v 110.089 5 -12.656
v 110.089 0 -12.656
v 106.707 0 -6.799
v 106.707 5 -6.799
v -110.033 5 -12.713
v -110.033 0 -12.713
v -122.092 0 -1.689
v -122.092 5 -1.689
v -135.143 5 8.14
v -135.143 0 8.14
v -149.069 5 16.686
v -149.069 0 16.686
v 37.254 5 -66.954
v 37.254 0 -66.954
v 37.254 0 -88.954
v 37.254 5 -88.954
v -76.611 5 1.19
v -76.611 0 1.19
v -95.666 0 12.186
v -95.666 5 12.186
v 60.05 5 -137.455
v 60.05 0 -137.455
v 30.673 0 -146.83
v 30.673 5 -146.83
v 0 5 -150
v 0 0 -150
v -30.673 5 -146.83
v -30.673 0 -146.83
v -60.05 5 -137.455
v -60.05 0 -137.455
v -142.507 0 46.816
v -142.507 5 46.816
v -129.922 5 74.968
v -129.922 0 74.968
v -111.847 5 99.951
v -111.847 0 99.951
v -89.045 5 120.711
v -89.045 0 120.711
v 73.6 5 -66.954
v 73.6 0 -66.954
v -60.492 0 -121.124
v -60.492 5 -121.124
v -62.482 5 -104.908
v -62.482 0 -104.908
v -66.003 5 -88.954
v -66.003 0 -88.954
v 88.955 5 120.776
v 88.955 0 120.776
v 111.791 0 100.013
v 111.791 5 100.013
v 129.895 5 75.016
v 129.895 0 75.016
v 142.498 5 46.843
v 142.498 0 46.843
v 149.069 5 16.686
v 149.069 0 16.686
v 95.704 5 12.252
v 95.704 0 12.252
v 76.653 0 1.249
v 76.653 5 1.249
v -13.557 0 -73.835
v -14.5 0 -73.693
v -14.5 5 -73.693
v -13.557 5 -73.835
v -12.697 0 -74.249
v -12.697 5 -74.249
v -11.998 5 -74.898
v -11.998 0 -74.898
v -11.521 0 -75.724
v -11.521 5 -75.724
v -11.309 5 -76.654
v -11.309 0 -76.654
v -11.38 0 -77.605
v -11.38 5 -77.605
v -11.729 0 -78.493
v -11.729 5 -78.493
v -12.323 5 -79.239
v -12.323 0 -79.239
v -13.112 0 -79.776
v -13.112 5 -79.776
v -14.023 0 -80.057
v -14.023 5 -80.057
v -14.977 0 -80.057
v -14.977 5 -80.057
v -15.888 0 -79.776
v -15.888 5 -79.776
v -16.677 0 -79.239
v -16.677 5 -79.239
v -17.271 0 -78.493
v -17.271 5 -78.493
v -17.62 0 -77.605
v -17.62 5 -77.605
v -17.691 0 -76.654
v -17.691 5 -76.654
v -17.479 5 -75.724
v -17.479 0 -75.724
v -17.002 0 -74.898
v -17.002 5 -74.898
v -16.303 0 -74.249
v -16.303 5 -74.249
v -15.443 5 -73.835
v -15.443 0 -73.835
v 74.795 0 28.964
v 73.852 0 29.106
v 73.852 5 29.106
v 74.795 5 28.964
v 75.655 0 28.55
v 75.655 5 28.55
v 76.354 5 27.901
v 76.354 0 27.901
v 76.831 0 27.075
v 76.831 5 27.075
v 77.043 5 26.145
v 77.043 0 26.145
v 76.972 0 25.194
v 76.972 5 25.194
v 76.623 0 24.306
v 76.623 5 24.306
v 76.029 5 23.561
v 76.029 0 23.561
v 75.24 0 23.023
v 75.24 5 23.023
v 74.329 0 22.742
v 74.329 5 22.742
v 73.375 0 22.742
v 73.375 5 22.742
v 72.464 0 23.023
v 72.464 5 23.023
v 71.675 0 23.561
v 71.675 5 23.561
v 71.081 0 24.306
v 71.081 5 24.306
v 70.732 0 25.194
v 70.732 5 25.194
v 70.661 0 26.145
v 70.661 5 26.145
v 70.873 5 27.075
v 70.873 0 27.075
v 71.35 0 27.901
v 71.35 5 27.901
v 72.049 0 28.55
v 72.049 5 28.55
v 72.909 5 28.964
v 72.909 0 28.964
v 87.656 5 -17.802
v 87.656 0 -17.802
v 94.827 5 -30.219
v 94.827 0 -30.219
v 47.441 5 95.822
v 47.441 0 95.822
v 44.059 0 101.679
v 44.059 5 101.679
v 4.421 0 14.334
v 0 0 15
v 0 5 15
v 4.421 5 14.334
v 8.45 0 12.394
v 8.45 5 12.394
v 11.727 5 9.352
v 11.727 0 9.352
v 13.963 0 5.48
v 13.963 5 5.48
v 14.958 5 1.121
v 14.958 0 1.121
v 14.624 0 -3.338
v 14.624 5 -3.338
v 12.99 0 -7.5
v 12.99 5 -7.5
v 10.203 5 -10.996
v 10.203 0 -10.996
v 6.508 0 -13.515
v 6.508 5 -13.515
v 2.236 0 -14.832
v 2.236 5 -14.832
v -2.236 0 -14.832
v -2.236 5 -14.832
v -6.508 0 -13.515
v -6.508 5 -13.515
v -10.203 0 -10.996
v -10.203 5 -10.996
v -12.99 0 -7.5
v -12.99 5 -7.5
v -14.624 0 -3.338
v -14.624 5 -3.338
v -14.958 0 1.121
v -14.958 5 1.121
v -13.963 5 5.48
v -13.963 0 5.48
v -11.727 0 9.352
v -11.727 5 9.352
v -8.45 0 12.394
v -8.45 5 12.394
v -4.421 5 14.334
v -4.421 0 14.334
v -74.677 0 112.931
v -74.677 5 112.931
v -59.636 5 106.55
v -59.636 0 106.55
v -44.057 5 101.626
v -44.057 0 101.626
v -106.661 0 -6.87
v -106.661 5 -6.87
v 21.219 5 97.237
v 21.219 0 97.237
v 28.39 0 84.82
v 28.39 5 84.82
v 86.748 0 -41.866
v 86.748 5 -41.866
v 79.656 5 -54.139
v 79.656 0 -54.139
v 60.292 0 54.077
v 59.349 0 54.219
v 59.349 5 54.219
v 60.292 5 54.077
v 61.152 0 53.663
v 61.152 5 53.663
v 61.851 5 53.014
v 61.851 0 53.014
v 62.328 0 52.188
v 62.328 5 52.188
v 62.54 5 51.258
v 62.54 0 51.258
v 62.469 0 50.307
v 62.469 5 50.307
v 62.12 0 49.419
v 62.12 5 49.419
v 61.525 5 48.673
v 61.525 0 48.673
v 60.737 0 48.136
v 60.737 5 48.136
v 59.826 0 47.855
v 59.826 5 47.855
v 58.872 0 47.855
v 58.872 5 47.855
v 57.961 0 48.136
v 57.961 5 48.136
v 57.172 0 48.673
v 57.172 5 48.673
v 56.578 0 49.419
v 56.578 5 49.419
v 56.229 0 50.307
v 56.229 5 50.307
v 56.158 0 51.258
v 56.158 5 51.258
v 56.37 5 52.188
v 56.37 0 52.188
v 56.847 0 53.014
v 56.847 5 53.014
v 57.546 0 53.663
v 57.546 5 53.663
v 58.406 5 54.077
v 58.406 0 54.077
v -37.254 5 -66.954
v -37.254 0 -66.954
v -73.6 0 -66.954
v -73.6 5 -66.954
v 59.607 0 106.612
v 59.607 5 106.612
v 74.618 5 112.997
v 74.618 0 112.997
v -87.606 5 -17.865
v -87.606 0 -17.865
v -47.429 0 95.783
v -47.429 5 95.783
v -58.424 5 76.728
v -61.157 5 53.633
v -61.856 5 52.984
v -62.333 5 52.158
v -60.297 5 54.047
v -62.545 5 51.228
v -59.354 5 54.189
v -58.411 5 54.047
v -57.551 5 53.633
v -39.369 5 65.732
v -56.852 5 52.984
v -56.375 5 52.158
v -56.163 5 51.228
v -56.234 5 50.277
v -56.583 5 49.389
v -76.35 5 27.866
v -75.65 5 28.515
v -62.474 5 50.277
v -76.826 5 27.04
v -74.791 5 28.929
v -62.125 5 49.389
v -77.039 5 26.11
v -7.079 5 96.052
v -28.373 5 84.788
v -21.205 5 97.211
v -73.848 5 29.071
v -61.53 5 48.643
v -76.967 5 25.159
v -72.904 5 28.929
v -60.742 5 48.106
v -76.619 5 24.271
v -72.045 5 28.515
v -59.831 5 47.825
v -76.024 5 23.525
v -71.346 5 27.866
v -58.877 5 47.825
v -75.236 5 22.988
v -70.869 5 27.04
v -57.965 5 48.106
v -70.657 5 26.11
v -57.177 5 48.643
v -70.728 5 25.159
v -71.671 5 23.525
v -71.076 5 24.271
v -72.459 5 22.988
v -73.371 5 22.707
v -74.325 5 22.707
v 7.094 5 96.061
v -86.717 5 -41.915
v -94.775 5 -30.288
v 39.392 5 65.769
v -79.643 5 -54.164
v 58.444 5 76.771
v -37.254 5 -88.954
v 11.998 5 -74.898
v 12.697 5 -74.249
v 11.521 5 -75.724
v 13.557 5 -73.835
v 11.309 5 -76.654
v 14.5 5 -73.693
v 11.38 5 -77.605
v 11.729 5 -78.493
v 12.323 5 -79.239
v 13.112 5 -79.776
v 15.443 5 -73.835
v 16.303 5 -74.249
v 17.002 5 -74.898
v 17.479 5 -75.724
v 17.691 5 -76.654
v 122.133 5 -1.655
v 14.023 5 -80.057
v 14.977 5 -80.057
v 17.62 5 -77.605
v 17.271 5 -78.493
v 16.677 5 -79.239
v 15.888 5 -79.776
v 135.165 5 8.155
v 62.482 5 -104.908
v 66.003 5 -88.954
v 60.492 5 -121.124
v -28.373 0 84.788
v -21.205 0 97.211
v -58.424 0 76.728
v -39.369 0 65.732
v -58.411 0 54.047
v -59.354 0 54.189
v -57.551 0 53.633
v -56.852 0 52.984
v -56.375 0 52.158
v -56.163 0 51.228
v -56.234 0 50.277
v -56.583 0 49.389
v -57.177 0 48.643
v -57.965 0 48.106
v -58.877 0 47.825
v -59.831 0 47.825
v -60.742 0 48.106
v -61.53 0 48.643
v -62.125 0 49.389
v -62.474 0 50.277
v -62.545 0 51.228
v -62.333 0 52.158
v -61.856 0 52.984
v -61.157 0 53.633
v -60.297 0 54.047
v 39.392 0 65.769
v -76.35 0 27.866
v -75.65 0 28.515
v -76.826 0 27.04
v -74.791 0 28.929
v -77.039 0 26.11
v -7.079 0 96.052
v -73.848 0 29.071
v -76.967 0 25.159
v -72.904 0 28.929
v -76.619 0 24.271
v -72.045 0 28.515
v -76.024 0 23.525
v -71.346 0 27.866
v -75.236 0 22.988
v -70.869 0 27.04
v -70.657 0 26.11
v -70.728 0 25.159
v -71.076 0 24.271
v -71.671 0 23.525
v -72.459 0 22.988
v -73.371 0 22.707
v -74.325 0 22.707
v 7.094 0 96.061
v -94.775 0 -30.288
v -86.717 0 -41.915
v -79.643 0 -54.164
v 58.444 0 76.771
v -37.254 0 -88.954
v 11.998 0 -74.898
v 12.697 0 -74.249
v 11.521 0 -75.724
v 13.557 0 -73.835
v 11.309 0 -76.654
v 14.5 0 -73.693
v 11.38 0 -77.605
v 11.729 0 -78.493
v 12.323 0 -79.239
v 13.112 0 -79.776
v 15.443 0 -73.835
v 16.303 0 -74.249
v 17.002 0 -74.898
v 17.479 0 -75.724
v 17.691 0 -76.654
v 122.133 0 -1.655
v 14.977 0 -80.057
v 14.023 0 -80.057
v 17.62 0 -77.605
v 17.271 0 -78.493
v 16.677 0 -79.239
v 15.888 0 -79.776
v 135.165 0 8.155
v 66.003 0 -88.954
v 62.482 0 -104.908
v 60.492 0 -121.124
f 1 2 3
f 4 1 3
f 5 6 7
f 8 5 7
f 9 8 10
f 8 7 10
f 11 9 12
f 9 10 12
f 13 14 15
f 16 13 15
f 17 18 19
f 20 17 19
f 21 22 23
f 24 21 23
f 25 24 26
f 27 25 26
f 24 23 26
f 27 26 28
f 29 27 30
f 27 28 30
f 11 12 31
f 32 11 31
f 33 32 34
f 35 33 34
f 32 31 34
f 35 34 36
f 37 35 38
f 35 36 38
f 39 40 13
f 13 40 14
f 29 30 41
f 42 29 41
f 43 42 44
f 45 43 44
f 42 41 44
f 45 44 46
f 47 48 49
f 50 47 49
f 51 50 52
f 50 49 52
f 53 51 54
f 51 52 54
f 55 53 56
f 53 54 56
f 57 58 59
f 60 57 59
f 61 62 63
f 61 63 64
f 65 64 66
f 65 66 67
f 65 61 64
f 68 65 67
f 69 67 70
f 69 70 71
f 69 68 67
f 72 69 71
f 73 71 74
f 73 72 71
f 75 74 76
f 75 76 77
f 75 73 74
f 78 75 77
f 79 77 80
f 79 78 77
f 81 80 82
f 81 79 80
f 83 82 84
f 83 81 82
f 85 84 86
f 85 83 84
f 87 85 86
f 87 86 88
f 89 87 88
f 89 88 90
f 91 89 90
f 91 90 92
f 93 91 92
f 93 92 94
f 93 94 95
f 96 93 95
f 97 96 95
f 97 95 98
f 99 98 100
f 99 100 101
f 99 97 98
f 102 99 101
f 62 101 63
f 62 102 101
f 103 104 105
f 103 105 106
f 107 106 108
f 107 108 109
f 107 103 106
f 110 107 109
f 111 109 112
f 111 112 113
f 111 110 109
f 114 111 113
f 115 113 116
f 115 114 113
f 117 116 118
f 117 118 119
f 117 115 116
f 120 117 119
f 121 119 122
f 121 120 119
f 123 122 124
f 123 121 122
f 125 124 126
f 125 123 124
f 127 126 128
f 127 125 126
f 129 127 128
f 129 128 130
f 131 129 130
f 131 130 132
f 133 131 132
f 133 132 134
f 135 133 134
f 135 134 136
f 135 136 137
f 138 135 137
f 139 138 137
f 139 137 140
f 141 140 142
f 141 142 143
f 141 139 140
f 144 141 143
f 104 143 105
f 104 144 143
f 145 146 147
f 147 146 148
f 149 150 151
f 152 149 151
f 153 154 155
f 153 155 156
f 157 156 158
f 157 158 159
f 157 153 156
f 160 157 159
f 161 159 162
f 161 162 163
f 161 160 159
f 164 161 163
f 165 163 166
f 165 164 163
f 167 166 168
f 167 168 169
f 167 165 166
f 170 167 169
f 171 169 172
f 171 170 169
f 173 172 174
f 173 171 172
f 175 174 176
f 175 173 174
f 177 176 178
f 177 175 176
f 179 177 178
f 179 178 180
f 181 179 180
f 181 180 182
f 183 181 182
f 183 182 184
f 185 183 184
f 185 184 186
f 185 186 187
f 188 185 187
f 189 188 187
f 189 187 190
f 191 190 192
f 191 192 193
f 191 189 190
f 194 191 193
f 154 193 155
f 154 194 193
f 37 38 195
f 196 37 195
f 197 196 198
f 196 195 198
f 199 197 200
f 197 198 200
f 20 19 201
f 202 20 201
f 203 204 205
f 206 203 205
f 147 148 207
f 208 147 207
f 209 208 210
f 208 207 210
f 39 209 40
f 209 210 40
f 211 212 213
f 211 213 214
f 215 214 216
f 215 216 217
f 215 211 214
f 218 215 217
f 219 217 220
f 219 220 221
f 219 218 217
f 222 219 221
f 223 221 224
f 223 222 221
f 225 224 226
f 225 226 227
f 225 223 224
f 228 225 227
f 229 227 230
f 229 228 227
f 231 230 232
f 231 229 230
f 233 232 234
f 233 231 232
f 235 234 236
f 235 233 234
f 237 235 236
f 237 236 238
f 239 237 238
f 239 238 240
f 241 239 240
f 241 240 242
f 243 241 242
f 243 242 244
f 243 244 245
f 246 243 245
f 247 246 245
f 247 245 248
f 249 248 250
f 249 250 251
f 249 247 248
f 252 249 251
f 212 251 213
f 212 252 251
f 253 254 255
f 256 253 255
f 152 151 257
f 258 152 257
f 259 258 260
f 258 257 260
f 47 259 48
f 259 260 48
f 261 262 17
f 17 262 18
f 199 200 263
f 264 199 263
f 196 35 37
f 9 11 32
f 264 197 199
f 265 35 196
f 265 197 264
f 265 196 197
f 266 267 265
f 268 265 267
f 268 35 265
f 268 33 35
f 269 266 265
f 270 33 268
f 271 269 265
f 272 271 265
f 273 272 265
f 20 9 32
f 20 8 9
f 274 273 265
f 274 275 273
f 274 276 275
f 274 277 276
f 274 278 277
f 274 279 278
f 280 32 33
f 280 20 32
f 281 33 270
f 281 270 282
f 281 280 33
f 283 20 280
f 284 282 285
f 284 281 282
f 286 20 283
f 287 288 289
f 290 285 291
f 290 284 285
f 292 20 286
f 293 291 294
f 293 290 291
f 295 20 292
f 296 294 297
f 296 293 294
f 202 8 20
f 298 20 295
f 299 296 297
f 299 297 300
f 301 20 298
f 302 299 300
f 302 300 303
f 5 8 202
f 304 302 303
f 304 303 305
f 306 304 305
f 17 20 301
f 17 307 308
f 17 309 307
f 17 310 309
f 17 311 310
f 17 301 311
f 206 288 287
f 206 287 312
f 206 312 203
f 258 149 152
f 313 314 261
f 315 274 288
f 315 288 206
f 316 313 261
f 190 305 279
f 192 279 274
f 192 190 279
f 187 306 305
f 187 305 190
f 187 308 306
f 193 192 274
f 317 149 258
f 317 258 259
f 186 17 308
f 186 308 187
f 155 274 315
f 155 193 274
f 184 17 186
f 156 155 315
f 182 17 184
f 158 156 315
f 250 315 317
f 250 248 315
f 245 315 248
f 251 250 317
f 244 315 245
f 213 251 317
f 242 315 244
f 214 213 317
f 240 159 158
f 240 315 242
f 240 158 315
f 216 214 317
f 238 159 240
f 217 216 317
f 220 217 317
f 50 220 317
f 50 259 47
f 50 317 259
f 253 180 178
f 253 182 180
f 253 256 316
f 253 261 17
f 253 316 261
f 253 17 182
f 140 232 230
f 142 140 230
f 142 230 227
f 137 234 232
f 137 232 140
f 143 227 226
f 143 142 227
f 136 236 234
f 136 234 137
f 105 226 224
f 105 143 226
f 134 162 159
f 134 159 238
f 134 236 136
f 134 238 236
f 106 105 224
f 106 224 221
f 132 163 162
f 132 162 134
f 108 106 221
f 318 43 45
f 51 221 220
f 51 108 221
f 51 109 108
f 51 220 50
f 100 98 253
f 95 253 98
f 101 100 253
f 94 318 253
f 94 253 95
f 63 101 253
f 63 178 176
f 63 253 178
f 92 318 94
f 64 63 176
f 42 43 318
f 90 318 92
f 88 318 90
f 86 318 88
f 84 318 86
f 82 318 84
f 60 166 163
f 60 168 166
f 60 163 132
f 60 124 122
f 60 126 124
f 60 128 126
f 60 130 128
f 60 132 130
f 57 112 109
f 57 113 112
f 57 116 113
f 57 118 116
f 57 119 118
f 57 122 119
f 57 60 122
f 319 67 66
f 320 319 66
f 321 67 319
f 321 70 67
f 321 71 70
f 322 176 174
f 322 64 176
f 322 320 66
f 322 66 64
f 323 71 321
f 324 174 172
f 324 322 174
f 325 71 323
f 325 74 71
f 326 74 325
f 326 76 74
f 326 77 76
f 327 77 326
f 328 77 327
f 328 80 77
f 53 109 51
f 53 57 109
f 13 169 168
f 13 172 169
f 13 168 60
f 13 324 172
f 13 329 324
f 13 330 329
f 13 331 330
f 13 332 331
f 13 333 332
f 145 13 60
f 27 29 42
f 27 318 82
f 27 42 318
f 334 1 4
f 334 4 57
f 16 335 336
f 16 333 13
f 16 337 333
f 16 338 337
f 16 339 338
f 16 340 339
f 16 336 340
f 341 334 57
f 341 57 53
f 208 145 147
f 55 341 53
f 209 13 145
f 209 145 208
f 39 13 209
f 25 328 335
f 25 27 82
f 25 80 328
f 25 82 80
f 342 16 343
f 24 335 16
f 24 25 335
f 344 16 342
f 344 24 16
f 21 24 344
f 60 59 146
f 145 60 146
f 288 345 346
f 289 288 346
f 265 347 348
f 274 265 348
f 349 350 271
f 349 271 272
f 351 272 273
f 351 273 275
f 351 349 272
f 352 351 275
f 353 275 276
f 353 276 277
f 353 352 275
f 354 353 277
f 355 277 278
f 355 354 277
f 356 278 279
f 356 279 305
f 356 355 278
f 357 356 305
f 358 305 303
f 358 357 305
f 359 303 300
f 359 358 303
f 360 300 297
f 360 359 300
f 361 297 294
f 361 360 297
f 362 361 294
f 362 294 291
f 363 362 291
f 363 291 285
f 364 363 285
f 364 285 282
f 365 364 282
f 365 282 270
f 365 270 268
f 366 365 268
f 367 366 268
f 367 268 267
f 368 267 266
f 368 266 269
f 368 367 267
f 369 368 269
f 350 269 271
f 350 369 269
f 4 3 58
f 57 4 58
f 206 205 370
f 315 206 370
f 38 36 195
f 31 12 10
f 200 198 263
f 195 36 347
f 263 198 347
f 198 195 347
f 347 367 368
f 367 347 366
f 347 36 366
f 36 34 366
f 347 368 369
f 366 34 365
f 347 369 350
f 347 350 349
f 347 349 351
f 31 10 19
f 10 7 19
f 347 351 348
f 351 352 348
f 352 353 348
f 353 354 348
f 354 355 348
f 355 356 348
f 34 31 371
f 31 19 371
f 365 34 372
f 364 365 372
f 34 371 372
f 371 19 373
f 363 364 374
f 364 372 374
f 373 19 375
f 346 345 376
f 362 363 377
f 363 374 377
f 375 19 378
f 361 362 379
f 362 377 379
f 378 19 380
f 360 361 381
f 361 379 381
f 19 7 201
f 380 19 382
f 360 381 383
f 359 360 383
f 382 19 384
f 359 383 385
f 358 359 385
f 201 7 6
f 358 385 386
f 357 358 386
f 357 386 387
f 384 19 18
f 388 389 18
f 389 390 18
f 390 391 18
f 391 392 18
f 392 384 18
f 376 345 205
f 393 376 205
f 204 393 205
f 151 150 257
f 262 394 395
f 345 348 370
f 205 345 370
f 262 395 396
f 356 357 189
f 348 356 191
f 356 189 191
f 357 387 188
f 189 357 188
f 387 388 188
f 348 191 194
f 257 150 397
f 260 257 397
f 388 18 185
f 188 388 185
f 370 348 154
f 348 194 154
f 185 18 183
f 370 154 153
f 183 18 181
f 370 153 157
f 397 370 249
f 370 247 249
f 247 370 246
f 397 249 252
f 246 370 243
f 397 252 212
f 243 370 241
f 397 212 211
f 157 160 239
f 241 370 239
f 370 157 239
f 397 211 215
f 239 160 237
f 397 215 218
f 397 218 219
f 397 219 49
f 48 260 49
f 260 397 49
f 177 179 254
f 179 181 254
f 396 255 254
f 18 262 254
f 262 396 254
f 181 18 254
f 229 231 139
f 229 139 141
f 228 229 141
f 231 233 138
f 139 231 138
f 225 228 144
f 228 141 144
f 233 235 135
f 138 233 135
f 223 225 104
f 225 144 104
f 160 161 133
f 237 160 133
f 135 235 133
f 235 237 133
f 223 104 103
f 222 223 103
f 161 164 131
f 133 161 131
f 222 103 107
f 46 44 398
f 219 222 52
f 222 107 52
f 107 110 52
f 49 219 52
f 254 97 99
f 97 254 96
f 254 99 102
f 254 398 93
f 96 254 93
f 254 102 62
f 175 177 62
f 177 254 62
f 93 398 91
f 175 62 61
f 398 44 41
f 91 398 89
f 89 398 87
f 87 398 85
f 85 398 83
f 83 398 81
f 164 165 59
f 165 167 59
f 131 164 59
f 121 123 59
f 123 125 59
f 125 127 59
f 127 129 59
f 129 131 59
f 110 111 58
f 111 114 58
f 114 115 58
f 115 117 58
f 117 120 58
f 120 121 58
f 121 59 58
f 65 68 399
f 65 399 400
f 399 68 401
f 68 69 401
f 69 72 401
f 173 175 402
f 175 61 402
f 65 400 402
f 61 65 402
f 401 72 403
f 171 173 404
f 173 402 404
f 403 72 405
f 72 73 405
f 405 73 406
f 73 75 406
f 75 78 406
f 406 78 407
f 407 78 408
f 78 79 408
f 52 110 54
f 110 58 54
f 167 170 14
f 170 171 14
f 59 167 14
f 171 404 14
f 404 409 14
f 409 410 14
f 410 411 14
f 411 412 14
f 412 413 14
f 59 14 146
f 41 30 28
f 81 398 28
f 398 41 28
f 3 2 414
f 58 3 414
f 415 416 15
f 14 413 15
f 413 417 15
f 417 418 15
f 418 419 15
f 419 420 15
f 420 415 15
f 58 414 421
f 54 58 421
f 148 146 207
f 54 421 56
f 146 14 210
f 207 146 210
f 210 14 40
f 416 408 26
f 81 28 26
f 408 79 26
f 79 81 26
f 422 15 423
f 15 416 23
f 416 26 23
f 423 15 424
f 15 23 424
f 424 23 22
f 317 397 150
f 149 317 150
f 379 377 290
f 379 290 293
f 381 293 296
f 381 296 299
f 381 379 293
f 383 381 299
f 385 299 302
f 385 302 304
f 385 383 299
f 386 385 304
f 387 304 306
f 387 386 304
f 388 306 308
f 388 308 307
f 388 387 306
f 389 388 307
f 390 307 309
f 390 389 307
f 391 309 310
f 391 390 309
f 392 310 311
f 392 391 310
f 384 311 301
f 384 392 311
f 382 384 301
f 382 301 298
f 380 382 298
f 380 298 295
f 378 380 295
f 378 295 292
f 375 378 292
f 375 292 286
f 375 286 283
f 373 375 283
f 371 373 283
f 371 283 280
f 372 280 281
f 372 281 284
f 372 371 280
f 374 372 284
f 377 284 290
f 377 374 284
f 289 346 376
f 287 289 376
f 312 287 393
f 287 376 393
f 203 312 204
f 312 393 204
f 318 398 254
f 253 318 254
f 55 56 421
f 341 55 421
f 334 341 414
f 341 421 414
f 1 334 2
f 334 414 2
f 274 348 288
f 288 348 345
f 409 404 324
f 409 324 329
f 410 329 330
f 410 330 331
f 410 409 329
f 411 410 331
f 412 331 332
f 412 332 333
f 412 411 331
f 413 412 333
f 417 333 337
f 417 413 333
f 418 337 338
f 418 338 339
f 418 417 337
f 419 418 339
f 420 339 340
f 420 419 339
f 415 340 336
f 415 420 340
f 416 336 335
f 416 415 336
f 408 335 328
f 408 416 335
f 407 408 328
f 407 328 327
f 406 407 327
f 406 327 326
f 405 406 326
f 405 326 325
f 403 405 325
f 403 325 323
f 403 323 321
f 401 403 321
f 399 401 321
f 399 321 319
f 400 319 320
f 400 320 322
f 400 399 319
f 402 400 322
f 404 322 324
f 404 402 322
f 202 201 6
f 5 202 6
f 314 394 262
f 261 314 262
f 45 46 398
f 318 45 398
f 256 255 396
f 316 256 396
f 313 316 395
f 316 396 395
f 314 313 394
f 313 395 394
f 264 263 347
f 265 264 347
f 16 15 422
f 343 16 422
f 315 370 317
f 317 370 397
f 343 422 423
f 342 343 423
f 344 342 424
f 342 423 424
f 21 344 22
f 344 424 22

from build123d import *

# Parameters (mm, degrees)
ESQUISSE1_R        = 3.2
ESQUISSE1_R_2      = 15
BOSS_EXTRU_1_DEPTH = 5


with BuildPart() as part:
    # Esquisse1 → Boss.-Extru.1 (new body)
    with BuildSketch(Plane(origin=(0, 0, 0), x_dir=(1, 0, 0), z_dir=(0, 1, 0))):
        with BuildLine():
            Line((95.704424879, -12.251847565), (76.653223752, -1.249496196))
            Line((76.653223752, -1.249496196), (87.655575121, 17.80170493))
            Line((87.655575121, 17.80170493), (94.826792906, 30.219078976))
            ThreePointArc((94.826792906, 30.219078976), (83.075750919, 47.929028471), (73.600020266, 66.953744698))
            Line((73.600020266, 66.953744698), (59.253871219, 66.953744698))
            Line((59.253871219, 66.953744698), (37.253871219, 66.953744698))
            Line((37.253871219, 66.953744698), (37.253871219, 88.953744698))
            Line((37.253871219, 88.953744698), (59.253871219, 88.953744698))
            Line((59.253871219, 88.953744698), (66.003069732, 88.953744698))
            ThreePointArc((66.003069732, 88.953744698), (61.294306765, 112.991978793), (60.05, 137.455438234))
            ThreePointArc((60.05, 137.455438234), (0, 150), (-60.05, 137.455438234))
            ThreePointArc((-60.05, 137.455438234), (-61.294306765, 112.991978793), (-66.003069732, 88.953744698))
            Line((-66.003069732, 88.953744698), (-59.253871219, 88.953744698))
            Line((-59.253871219, 88.953744698), (-37.253871219, 88.953744698))
            Line((-37.253871219, 88.953744698), (-37.253871219, 66.953744698))
            Line((-37.253871219, 66.953744698), (-59.253871219, 66.953744698))
            Line((-59.253871219, 66.953744698), (-73.600020266, 66.953744698))
            ThreePointArc((-73.600020266, 66.953744698), (-83.054066993, 47.966565203), (-94.774500839, 30.288233406))
            Line((-94.774500839, 30.288233406), (-87.606022607, 17.864984041))
            Line((-87.606022607, 17.864984041), (-76.610725847, -1.190289486))
            Line((-76.610725847, -1.190289486), (-95.665999373, -12.185586245))
            Line((-95.665999373, -12.185586245), (-106.661296133, 6.869687281))
            Line((-106.661296133, 6.869687281), (-110.03272827, 12.712509258))
            ThreePointArc((-110.03272827, 12.712509258), (-128.500854083, -3.381043685), (-149.069024712, -16.686098152))
            ThreePointArc((-149.069024712, -16.686098152), (-129.922319498, -74.967932452), (-89.044700128, -120.710568631))
            ThreePointArc((-89.044700128, -120.710568631), (-67.232592853, -109.561304368), (-44.057183789, -101.625654924))
            Line((-44.057183789, -101.625654924), (-47.428615926, -95.782832947))
            Line((-47.428615926, -95.782832947), (-58.423912686, -76.727559421))
            Line((-58.423912686, -76.727559421), (-39.36863916, -65.732262661))
            Line((-39.36863916, -65.732262661), (-28.3733424, -84.787536188))
            Line((-28.3733424, -84.787536188), (-21.204864167, -97.210785553))
            ThreePointArc((-21.204864167, -97.210785553), (0.007838221, -95.910230344), (21.218905144, -97.237191709))
            Line((21.218905144, -97.237191709), (28.390122928, -84.819817663))
            Line((28.390122928, -84.819817663), (39.392474297, -65.768616537))
            Line((39.392474297, -65.768616537), (58.443675423, -76.770967905))
            Line((58.443675423, -76.770967905), (47.441324055, -95.822169032))
            Line((47.441324055, -95.822169032), (44.059067466, -101.678739902))
            ThreePointArc((44.059067466, -101.678739902), (67.188172186, -109.626679928), (88.955287671, -120.776474511))
            ThreePointArc((88.955287671, -120.776474511), (129.894553134, -75.01603206), (149.069024712, -16.686098152))
            ThreePointArc((149.069024712, -16.686098152), (128.532739261, -3.405050916), (110.089032837, 12.655924432))
            Line((110.089032837, 12.655924432), (106.706776248, 6.799353561))
            Line((106.706776248, 6.799353561), (95.704424879, -12.251847565))
        make_face()
        with Locations(Location((14.5, 76.893024973, 0), (0, 0, 270))):
            Circle(ESQUISSE1_R, mode=Mode.SUBTRACT)
        with Locations(Location((-14.5, 76.893024973, 0), (0, 0, 270))):
            Circle(ESQUISSE1_R, mode=Mode.SUBTRACT)
        with Locations(Location((-73.847701188, -25.870916463, 0), (0, 0, 270))):
            Circle(ESQUISSE1_R, mode=Mode.SUBTRACT)
        with Locations(Location((-59.353900914, -50.989231566, 0), (0, 0, 270))):
            Circle(ESQUISSE1_R, mode=Mode.SUBTRACT)
        with Locations(Location((59.348929552, -51.019238622, 0), (0, 0, 270))):
            Circle(ESQUISSE1_R, mode=Mode.SUBTRACT)
        with Locations(Location((73.852029084, -25.906291683, 0), (0, 0, 270))):
            Circle(ESQUISSE1_R, mode=Mode.SUBTRACT)
        with Locations(Location((0, 0, 0), (0, 0, 270))):
            Circle(ESQUISSE1_R_2, mode=Mode.SUBTRACT)
    extrude(amount=BOSS_EXTRU_1_DEPTH)


solid = part.part
